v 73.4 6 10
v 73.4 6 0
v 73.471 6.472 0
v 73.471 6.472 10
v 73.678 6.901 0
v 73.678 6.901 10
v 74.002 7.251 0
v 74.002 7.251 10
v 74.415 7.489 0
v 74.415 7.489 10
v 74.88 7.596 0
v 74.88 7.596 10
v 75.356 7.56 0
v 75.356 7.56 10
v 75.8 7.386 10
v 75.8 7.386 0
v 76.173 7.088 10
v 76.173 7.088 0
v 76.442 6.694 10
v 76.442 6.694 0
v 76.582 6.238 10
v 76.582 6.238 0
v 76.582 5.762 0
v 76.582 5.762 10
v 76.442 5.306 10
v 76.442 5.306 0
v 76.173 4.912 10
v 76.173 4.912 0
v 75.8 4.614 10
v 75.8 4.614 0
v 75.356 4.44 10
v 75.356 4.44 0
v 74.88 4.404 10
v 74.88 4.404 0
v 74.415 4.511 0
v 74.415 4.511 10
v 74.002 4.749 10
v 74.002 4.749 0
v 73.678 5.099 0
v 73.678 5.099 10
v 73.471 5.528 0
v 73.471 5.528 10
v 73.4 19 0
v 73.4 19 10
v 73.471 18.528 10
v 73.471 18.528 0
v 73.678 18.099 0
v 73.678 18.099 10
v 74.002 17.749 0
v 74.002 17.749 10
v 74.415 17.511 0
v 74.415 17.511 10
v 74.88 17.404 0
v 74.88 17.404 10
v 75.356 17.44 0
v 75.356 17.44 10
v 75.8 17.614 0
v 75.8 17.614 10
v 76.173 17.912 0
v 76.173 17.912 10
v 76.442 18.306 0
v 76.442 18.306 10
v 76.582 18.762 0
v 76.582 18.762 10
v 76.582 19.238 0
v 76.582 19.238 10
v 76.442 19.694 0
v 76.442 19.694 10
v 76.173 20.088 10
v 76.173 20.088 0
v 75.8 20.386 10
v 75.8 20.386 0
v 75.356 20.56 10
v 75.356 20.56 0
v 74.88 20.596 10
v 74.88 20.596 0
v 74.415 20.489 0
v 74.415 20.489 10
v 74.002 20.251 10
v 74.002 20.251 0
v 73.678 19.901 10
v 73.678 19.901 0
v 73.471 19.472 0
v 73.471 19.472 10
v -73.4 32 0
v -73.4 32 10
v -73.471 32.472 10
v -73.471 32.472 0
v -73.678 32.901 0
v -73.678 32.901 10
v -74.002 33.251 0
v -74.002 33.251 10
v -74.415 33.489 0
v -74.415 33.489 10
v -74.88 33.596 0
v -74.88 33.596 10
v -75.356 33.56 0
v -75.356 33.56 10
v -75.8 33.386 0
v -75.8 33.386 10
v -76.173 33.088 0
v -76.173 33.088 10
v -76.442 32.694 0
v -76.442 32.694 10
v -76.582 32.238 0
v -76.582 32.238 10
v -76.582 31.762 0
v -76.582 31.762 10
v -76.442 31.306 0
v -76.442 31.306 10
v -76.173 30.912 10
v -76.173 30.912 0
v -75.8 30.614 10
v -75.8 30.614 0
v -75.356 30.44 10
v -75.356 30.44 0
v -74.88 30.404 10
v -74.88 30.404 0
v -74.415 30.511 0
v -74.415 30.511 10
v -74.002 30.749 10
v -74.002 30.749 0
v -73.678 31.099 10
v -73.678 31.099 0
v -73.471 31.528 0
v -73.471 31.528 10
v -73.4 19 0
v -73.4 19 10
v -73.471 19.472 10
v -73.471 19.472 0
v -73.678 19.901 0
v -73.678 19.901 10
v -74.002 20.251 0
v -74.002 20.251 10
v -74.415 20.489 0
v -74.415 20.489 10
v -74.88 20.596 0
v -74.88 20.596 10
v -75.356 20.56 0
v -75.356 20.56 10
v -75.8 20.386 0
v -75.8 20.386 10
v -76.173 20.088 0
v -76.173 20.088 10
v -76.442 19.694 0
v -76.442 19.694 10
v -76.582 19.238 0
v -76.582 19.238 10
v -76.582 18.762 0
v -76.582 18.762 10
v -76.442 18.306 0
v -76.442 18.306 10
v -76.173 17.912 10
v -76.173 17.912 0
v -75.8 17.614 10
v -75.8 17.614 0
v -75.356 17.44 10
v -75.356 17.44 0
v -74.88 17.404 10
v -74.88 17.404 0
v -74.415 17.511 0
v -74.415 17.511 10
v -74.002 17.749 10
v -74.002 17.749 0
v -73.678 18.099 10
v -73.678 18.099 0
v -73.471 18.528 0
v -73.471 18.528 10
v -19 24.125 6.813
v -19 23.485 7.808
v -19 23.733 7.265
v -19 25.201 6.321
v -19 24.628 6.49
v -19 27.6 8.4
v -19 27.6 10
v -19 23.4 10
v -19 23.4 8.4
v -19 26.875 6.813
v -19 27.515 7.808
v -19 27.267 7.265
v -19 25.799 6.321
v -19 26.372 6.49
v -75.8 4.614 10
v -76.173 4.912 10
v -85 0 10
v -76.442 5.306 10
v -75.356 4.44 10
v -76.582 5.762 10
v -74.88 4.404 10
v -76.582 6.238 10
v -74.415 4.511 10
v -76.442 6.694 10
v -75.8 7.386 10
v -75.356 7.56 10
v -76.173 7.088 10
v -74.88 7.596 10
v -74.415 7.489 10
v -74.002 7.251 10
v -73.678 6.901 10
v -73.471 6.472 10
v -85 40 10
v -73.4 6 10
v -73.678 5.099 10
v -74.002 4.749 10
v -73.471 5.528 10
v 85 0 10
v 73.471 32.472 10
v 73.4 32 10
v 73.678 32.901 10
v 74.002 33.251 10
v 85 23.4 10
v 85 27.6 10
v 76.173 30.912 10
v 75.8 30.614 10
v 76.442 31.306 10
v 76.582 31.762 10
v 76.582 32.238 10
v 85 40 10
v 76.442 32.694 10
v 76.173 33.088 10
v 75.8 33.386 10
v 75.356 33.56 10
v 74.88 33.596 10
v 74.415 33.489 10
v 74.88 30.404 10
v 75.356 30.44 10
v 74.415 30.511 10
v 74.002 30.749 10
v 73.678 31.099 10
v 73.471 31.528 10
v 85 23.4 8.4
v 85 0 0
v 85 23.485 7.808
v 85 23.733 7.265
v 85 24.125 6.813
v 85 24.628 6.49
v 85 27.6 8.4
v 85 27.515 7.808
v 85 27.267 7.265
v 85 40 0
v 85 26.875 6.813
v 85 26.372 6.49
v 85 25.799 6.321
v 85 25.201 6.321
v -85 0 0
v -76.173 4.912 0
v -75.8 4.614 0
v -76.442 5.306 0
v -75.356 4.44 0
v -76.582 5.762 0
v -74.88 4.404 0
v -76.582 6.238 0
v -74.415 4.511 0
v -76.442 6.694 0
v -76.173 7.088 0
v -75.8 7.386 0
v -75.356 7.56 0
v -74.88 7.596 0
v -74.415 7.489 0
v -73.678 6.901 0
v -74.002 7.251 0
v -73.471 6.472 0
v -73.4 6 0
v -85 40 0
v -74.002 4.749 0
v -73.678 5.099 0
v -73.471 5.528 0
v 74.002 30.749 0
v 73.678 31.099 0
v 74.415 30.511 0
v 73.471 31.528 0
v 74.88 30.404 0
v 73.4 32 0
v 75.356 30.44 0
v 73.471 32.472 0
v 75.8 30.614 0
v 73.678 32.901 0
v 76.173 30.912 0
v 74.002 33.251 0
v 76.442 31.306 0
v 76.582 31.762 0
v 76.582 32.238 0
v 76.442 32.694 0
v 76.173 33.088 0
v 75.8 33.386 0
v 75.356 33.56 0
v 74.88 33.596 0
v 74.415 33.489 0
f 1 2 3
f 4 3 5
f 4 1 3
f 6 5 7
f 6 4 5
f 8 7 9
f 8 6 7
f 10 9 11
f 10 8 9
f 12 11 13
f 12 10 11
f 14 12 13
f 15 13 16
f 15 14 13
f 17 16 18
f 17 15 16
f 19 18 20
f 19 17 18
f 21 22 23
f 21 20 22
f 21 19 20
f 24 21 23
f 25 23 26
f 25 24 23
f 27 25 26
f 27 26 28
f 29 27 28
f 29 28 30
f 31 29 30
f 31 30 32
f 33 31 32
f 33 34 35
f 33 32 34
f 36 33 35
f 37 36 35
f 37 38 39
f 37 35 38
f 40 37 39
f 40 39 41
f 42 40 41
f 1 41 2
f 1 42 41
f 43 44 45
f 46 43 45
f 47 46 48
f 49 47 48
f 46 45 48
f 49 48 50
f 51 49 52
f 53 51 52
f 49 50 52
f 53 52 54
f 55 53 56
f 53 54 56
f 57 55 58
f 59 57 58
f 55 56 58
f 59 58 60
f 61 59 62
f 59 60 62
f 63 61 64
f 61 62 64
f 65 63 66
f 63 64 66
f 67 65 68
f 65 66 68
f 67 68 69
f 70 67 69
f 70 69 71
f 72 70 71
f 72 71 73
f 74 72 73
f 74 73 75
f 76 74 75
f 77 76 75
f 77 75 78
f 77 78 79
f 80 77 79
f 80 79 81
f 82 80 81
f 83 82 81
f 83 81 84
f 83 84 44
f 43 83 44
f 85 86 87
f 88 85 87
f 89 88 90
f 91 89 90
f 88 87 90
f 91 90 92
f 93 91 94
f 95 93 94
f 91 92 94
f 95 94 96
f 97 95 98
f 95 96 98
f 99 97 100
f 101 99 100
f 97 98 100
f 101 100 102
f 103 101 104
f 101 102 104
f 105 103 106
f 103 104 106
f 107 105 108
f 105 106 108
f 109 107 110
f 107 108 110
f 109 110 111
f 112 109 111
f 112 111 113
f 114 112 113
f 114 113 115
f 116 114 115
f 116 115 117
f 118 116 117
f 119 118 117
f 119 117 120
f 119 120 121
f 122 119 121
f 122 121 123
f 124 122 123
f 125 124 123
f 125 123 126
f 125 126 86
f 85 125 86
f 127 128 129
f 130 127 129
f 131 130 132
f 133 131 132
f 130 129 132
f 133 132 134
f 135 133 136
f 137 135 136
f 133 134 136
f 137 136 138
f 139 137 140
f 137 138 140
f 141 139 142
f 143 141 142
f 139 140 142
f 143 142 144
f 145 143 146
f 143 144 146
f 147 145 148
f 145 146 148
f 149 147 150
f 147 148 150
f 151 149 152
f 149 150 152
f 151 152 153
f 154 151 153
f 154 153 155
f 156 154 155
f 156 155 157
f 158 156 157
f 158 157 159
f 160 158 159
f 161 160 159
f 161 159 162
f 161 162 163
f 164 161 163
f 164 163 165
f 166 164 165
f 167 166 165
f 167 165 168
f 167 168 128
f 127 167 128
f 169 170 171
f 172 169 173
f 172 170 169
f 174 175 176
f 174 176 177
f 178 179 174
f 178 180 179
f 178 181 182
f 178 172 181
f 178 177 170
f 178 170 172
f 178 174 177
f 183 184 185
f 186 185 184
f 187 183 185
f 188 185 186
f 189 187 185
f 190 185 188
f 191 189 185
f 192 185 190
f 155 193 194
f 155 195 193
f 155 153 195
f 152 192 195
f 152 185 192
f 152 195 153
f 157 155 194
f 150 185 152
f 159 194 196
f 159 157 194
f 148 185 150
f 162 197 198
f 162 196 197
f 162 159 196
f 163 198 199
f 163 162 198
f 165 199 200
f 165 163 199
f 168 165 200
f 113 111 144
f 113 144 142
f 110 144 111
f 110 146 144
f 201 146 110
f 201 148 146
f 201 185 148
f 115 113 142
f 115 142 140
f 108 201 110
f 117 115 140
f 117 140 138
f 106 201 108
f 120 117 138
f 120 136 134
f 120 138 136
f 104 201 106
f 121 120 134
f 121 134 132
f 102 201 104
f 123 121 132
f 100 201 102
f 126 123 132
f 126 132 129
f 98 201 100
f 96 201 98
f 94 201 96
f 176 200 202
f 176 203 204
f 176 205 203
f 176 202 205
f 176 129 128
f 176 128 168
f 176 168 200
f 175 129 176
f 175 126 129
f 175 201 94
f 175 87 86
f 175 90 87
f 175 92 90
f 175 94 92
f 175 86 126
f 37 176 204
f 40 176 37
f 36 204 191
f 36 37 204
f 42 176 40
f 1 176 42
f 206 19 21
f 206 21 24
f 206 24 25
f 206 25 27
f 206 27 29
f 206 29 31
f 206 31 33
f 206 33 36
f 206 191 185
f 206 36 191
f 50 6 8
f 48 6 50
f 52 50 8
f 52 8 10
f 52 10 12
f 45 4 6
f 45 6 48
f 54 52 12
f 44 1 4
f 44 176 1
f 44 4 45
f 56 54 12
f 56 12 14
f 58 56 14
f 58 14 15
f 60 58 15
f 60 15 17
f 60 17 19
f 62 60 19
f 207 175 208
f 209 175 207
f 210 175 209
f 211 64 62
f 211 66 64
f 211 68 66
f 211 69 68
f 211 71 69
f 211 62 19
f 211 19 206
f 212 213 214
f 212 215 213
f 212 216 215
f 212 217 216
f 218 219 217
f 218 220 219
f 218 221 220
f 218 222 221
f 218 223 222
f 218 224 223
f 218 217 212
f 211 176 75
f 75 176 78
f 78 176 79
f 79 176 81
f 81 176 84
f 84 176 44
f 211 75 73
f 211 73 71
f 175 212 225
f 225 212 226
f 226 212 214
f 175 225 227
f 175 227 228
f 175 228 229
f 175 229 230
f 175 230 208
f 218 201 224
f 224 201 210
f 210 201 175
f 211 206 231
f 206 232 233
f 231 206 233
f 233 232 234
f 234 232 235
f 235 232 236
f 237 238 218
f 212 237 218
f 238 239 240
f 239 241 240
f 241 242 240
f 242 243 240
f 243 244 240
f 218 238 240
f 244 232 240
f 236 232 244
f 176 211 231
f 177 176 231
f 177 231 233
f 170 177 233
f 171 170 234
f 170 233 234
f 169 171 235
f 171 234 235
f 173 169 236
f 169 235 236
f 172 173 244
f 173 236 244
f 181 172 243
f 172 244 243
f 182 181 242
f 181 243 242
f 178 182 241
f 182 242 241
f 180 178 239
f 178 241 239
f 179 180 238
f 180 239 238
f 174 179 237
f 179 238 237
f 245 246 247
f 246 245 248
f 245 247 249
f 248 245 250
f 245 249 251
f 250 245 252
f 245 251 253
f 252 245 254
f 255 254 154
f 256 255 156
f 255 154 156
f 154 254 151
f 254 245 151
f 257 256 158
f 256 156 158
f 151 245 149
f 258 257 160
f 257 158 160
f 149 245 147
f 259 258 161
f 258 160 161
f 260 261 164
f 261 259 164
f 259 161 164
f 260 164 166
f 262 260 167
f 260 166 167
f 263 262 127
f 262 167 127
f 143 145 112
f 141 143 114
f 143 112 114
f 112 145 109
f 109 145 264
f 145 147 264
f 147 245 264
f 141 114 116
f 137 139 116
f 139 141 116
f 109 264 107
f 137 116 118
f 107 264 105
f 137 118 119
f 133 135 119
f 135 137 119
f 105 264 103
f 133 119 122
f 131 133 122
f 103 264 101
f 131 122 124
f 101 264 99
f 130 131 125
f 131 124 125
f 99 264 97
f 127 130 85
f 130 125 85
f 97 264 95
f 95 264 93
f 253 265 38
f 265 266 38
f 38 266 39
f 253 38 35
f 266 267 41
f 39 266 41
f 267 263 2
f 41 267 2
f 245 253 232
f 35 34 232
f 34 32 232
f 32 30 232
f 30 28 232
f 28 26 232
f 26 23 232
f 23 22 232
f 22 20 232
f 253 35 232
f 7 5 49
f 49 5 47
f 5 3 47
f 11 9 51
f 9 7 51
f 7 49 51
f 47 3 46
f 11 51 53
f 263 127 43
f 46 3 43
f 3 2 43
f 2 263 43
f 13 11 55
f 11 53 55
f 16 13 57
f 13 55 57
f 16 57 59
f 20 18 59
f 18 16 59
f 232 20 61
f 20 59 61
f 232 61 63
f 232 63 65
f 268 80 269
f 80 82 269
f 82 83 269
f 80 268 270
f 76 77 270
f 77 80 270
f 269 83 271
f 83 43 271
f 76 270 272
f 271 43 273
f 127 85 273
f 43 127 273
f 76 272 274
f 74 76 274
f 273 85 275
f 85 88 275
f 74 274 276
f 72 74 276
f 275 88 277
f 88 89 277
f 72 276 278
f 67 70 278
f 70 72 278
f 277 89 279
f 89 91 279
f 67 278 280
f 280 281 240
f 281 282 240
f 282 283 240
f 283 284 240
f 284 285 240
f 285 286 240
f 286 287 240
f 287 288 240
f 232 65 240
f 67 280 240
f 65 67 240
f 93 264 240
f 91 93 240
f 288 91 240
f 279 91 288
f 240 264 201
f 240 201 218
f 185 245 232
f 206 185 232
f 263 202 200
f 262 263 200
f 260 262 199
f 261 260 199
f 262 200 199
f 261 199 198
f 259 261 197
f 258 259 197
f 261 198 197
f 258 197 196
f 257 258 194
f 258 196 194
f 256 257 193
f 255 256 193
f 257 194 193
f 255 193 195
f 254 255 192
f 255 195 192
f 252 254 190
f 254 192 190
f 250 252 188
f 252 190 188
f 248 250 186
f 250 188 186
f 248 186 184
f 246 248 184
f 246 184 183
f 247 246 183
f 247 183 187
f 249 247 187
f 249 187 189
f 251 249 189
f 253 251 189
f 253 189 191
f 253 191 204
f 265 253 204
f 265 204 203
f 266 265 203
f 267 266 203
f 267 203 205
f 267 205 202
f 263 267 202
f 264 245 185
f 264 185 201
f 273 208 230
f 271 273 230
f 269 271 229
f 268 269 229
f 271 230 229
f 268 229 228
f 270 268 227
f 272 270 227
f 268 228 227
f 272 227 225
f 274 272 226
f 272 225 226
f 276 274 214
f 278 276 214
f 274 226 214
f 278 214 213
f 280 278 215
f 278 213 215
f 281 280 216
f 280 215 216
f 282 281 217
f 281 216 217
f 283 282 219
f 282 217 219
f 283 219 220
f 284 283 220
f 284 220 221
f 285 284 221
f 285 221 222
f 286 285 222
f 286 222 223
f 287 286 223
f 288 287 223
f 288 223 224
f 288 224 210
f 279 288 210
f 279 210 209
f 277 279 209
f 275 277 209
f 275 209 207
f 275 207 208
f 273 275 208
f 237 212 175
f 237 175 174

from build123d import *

# Parameters (mm, degrees)
SKETCH1_W                 = 170
SKETCH1_H                 = 40
BOSS_EXTRUDE1_DEPTH       = 10
SKETCH2_R                 = 1.6
CUT_M3_HOLE_DEPTH         = 11
LPATTERN1_COUNT           = 3
LPATTERN1_PITCH           = 13
LPATTERN1_COPY_1_SKETCH_R = 1.6
LPATTERN1_COPY_1_DEPTH    = 11
LPATTERN1_COPY_2_SKETCH_R = 1.6
LPATTERN1_COPY_2_DEPTH    = 11
SKETCH3_R                 = 2.1
CUT_TUBE_SLOT_DEPTH       = 104
SKETCH4_W                 = 1.6
SKETCH4_H                 = 4.2
CUT_EXTRUDE3_DEPTH        = 104


with BuildPart() as part:
    # Sketch1 → Boss-Extrude1 (new body)
    with BuildSketch(Plane.XY):
        with Locations((0, 20)):
            Rectangle(SKETCH1_W, SKETCH1_H)
    extrude(amount=BOSS_EXTRUDE1_DEPTH)

    # Sketch2 → Cut-M3 Hole (cut, through all)
    with BuildSketch(Plane.XY.offset(10)):
        with Locations((-75, 6)):
            Circle(SKETCH2_R)
    cut_m3_hole = extrude(amount=-CUT_M3_HOLE_DEPTH, mode=Mode.SUBTRACT)

    # Mirror1: Cut-M3 Hole across plane
    add(cut_m3_hole.mirror(Plane(origin=(0, 0, 0), x_dir=(0, 0, 1), z_dir=(1, 0, 0))), mode=Mode.SUBTRACT)

    # LPattern1: Cut-M3 Hole ×3
    with Locations(*[(0, i * LPATTERN1_PITCH, 0) for i in range(1, LPATTERN1_COUNT)]):
        add(cut_m3_hole, mode=Mode.SUBTRACT)

    # LPattern1 copy 1 sketch → LPattern1 copy 1 (cut, through all)
    with BuildSketch(Plane(origin=(0, 13, 10), x_dir=(-1, 0, 0), z_dir=(0, 0, 1))):
        with Locations((-75, -6)):
            Circle(LPATTERN1_COPY_1_SKETCH_R)
    extrude(amount=-LPATTERN1_COPY_1_DEPTH, mode=Mode.SUBTRACT)

    # LPattern1 copy 2 sketch → LPattern1 copy 2 (cut, through all)
    with BuildSketch(Plane(origin=(0, 26, 10), x_dir=(-1, 0, 0), z_dir=(0, 0, 1))):
        with Locations((-75, -6)):
            Circle(LPATTERN1_COPY_2_SKETCH_R)
    extrude(amount=-LPATTERN1_COPY_2_DEPTH, mode=Mode.SUBTRACT)

    # Sketch3 → Cut-Tube Slot (cut)
    with BuildSketch(Plane(origin=(85, 0, 0), x_dir=(0, 0, -1), z_dir=(1, 0, 0))):
        with Locations((-8.4, 25.5)):
            Circle(SKETCH3_R)
    extrude(amount=-CUT_TUBE_SLOT_DEPTH, mode=Mode.SUBTRACT)

    # Sketch4 → Cut-Extrude3 (cut)
    with BuildSketch(Plane(origin=(85, 0, 0), x_dir=(0, 0, -1), z_dir=(1, 0, 0))):
        with Locations((-9.2, 25.5)):
            Rectangle(SKETCH4_W, SKETCH4_H)
    extrude(amount=-CUT_EXTRUDE3_DEPTH, mode=Mode.SUBTRACT)


solid = part.part
